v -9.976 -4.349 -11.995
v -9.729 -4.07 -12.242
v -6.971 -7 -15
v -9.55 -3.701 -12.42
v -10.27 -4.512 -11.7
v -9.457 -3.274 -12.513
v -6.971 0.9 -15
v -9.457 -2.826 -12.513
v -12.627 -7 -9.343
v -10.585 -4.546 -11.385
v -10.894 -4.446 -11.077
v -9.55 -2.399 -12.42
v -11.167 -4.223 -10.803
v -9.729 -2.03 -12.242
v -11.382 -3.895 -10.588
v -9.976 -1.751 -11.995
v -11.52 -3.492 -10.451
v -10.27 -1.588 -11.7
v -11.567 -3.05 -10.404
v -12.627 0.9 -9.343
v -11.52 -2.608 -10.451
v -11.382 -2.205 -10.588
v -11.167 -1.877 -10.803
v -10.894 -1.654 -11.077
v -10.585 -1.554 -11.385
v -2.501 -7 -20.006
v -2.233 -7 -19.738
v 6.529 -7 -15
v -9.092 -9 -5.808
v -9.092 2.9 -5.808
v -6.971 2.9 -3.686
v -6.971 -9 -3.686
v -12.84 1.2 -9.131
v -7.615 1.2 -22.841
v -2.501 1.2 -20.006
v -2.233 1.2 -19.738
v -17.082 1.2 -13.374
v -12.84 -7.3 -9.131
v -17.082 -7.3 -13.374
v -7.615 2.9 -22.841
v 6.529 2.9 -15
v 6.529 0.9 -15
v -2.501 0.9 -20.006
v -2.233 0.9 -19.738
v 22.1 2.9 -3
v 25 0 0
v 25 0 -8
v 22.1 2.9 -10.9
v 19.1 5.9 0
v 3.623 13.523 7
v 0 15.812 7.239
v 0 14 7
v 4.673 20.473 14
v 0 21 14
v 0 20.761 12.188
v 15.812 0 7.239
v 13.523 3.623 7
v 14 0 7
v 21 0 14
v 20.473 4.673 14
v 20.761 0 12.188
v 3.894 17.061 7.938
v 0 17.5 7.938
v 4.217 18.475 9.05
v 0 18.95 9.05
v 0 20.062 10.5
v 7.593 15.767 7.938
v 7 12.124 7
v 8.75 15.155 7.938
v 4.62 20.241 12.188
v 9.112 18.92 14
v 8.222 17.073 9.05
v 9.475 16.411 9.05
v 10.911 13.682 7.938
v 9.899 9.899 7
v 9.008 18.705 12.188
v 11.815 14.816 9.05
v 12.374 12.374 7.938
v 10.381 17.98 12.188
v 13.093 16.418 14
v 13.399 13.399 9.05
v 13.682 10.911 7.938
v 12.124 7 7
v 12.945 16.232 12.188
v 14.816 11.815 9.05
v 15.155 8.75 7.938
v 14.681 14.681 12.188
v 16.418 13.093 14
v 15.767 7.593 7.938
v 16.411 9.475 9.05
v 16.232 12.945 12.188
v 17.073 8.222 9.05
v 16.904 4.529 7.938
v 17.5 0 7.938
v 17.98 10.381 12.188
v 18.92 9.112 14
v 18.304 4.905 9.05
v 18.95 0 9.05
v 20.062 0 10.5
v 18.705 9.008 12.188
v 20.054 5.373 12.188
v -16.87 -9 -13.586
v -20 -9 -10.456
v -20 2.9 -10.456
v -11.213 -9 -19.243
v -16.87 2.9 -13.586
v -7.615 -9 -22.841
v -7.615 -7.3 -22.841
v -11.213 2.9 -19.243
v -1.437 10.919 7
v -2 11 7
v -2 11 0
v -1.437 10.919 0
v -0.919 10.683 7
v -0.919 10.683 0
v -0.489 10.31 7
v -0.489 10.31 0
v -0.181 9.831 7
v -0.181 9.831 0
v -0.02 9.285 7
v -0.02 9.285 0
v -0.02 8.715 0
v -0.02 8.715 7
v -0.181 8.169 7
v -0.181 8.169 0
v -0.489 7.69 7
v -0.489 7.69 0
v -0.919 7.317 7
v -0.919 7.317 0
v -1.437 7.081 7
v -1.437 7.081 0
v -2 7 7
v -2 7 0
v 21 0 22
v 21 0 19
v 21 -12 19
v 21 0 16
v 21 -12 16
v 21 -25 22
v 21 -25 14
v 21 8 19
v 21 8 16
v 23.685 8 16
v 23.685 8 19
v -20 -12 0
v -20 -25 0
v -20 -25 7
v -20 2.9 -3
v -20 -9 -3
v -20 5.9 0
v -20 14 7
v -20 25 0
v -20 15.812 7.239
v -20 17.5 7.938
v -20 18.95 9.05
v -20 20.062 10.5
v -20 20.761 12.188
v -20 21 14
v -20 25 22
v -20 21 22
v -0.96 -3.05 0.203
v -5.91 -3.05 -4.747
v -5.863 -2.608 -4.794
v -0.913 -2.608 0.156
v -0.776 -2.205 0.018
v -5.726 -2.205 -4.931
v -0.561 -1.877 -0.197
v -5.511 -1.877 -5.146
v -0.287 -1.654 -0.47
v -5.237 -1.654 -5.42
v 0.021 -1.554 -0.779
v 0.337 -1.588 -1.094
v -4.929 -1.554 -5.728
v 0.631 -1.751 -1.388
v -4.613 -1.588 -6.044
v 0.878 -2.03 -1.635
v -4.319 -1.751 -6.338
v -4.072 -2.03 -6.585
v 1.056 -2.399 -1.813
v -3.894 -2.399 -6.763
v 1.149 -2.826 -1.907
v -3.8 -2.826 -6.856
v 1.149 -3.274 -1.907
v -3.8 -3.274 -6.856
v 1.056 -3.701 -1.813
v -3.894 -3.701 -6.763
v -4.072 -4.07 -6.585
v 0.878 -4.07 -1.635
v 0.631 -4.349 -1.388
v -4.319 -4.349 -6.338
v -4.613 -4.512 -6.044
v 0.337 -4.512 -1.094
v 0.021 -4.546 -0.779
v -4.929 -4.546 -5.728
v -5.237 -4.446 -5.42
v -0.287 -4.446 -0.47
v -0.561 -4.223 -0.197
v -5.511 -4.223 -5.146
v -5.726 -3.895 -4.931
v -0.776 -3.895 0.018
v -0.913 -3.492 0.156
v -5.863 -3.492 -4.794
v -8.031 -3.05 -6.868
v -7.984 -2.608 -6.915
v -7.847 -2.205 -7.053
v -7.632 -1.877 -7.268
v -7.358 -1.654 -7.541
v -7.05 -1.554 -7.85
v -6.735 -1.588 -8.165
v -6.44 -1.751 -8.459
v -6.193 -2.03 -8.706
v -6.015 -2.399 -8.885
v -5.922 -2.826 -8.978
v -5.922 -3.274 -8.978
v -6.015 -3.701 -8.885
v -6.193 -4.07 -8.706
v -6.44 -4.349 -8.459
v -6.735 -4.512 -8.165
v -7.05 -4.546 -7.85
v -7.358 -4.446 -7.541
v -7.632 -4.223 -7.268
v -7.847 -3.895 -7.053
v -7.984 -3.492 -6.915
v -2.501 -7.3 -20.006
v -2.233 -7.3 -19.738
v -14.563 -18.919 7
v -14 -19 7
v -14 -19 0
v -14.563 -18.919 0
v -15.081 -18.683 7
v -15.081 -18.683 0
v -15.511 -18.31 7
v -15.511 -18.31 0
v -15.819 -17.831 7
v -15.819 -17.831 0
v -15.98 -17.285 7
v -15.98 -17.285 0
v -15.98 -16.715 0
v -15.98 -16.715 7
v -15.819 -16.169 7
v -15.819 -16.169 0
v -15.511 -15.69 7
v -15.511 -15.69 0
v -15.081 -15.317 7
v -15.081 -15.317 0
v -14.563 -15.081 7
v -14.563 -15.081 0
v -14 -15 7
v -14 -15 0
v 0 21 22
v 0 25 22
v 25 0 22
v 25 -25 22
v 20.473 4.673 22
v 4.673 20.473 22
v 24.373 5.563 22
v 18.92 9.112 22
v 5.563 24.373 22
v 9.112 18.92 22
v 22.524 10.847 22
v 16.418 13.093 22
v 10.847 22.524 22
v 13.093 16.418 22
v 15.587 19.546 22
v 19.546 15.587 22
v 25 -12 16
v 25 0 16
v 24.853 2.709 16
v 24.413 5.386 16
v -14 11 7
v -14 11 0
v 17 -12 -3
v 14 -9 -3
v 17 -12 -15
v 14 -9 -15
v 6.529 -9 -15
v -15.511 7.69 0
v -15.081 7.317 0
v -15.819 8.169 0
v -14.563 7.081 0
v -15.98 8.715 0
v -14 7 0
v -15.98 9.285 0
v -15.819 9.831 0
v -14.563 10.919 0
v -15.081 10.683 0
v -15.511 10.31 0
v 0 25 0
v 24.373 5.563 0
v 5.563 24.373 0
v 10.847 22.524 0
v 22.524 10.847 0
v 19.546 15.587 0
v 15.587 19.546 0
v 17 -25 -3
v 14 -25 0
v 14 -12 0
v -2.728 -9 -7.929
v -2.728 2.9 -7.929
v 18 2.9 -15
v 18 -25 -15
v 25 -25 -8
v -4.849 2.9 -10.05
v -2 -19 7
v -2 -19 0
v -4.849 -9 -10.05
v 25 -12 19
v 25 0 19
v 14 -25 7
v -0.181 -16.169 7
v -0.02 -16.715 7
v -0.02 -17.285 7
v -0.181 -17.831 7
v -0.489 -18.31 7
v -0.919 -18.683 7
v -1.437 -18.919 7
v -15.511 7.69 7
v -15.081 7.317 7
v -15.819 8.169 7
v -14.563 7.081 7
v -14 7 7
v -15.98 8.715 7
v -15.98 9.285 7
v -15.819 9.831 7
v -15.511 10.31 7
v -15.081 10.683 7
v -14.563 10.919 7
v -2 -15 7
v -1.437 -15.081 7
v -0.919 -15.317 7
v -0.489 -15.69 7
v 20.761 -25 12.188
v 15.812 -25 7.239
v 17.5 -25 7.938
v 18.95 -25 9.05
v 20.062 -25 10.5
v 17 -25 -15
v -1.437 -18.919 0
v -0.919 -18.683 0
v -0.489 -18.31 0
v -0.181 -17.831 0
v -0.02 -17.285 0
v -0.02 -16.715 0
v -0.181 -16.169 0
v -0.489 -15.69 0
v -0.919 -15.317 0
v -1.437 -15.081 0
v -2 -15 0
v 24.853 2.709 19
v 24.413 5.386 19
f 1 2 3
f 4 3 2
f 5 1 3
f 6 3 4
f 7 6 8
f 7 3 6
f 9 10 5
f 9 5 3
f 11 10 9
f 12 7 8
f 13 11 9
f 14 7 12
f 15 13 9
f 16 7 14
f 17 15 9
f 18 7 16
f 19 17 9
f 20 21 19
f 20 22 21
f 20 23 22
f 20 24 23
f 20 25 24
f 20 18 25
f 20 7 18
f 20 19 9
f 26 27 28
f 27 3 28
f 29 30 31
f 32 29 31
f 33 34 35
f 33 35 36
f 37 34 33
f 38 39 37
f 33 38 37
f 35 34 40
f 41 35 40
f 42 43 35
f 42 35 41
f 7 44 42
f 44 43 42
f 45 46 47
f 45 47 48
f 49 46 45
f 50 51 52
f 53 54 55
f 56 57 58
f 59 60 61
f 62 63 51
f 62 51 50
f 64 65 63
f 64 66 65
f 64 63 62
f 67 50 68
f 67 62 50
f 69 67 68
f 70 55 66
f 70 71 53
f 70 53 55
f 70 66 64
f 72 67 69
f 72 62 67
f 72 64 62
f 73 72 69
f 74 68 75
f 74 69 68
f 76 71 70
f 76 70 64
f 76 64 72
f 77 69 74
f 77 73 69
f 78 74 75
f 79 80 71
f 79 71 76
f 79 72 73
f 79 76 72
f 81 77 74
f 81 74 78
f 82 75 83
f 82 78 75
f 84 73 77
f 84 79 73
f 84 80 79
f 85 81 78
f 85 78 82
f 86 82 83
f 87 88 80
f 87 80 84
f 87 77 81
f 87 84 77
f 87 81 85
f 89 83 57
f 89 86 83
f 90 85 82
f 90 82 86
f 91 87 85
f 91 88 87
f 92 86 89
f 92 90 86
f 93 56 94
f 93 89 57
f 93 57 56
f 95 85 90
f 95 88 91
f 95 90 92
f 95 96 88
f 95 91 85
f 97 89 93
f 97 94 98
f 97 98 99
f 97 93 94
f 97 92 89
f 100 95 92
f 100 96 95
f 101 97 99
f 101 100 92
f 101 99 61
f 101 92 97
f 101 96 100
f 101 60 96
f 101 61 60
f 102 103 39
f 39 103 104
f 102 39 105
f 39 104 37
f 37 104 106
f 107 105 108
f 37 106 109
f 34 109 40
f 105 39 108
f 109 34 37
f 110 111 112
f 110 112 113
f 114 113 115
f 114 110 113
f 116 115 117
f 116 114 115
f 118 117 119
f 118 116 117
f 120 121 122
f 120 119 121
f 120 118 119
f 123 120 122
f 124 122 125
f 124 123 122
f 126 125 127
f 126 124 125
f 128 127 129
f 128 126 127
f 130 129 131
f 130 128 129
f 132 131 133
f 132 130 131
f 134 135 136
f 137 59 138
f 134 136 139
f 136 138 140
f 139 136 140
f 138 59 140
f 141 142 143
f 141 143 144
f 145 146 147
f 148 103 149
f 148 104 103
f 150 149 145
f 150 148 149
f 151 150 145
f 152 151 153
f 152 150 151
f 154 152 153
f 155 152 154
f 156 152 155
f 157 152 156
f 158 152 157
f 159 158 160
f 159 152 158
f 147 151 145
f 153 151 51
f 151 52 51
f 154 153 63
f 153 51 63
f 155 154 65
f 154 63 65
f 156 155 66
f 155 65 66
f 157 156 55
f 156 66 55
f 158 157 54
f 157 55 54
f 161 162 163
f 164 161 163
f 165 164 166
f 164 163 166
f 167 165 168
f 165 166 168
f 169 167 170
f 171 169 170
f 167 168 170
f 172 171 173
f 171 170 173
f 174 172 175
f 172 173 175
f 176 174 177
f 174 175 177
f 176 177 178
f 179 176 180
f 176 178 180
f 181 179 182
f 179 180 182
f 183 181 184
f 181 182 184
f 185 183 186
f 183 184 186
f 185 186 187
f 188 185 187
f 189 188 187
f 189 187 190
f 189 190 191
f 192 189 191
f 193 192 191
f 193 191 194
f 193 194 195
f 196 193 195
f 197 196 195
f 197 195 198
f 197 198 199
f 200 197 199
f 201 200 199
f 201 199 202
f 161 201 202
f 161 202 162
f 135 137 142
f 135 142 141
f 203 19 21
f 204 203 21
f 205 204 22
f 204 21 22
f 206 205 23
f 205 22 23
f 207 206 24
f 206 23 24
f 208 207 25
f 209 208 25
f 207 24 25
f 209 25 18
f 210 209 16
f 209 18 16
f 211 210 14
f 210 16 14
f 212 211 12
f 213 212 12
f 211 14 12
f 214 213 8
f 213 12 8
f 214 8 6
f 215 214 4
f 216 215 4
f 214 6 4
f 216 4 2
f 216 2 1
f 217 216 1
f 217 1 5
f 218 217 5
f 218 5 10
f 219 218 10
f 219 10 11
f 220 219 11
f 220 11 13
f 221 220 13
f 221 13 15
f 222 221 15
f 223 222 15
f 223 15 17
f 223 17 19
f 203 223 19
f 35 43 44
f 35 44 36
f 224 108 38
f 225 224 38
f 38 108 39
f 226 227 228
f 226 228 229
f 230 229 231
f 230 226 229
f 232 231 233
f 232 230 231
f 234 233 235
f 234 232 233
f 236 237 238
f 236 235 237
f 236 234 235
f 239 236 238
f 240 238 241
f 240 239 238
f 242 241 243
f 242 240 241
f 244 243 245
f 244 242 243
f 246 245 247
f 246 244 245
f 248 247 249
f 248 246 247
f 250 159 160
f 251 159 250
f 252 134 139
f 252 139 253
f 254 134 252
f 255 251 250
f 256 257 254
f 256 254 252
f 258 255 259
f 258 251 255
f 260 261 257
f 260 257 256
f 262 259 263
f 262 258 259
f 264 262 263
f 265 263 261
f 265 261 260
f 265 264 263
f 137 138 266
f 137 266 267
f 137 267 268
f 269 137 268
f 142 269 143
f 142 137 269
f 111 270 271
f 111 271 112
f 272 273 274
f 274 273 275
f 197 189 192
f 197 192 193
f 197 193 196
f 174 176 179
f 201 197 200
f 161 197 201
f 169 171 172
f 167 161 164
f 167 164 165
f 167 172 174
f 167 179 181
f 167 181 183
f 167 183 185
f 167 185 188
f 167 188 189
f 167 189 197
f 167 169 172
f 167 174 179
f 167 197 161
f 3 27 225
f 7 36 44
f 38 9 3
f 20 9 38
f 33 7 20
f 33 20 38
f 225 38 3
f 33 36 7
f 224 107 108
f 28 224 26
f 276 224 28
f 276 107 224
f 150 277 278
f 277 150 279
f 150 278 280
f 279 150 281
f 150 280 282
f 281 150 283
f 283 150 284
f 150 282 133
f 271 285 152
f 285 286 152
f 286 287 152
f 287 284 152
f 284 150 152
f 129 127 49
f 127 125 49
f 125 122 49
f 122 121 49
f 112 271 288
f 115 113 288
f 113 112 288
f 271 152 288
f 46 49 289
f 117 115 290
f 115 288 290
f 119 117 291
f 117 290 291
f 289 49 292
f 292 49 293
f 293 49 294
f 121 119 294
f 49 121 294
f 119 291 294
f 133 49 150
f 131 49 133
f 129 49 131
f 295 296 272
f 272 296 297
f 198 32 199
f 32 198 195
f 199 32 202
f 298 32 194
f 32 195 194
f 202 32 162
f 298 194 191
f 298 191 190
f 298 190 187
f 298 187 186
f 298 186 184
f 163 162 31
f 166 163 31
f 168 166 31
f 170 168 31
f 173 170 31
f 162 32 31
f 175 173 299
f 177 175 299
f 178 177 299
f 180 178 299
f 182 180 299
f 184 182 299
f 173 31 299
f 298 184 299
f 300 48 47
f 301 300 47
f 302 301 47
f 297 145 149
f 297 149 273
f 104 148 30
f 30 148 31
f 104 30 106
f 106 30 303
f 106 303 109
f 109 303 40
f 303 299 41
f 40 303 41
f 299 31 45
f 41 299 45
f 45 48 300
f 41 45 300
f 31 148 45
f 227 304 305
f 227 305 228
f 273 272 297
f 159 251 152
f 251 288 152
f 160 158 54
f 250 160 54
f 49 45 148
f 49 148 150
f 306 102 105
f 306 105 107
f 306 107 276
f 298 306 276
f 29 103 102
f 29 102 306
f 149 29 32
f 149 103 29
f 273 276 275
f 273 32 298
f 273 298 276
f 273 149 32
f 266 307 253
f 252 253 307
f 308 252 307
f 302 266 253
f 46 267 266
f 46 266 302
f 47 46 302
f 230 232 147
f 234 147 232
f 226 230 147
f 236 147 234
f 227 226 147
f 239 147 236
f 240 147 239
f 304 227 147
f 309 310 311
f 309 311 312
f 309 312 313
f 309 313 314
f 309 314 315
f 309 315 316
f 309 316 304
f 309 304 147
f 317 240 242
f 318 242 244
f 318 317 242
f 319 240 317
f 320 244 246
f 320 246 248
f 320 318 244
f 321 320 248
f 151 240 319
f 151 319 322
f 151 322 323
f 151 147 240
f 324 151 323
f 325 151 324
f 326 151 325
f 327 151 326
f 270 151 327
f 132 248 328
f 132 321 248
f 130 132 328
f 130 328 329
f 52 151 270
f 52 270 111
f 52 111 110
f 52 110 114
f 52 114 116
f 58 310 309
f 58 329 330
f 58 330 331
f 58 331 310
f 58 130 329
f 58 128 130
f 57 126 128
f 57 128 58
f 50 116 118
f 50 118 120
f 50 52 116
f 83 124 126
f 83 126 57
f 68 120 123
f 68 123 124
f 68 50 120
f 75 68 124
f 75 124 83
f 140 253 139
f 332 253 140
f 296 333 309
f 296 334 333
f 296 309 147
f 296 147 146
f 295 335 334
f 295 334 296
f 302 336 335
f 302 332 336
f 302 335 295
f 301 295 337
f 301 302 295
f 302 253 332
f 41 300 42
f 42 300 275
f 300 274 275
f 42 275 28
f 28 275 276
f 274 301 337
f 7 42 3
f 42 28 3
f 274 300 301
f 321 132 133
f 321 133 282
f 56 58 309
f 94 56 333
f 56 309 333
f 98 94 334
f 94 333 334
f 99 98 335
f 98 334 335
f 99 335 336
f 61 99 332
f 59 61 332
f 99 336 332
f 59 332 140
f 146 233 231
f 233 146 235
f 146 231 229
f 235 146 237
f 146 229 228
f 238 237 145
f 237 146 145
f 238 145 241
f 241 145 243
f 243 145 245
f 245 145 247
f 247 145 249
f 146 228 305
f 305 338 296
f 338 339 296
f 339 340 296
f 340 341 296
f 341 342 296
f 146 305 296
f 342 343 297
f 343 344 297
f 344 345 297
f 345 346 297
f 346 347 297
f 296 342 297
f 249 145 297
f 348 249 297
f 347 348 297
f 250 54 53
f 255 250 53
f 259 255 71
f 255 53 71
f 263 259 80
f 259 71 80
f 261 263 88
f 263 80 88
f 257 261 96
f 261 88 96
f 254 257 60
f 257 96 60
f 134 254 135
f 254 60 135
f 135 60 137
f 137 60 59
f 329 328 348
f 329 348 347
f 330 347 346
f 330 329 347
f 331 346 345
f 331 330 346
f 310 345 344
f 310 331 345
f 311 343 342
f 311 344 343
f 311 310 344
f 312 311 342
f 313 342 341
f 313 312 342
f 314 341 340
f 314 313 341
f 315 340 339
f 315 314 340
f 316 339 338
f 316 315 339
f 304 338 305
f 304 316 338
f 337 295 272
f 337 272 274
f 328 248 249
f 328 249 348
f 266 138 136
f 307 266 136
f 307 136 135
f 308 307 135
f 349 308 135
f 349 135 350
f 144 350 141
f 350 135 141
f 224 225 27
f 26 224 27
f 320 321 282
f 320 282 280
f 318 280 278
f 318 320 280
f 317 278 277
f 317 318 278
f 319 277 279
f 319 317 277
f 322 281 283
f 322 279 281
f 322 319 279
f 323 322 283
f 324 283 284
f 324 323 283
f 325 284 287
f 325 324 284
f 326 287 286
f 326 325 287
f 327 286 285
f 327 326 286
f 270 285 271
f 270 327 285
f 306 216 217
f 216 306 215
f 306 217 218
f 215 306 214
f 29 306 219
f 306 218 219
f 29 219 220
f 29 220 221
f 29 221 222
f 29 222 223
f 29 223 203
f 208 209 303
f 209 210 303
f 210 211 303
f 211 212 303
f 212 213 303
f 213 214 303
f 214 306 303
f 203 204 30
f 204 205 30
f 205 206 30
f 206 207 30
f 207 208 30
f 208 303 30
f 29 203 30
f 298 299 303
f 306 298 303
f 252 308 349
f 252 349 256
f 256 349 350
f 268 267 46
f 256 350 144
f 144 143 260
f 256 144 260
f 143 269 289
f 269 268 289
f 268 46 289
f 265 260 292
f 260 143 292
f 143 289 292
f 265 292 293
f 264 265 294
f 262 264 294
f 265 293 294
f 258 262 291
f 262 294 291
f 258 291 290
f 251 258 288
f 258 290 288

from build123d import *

# Parameters (mm, degrees)
BOSS_EXTRUDE1_DEPTH      = 7
EXTRUDE_THIN2_DEPTH      = 15
FILLET1_R                = 7
SKETCH5_W                = 15
SKETCH5_H                = 25
BOSS_EXTRUDE2_DEPTH      = 8
CUT_EXTRUDE2_DEPTH       = 42.641325627
LPATTERN1_COUNT          = 2
LPATTERN1_PITCH          = 26
CHAMFER3_SIZE            = 7
SKETCH9_W                = 15
SKETCH9_H                = 7
BOSS_EXTRUDE3_DEPTH      = 15
BOSS_EXTRUDE4_DEPTH      = 2
BOSS_EXTRUDE4_DEPTH_BACK = 9.9
SKETCH13_W               = 8
SKETCH13_H               = 2
BOSS_EXTRUDE6_DEPTH      = 6
CHAMFER6_SIZE            = 23.744712882
CHAMFER6_SIZE_2          = 13.5
CHAMFER7_SIZE            = 3
SKETCH14_R               = 1.5
CUT_EXTRUDE3_DEPTH       = 15
SKETCH15_W               = 15
SKETCH15_H               = 8.5
CUT_EXTRUDE4_DEPTH       = 6
CHAMFER8_SIZE            = 8
SKETCH16_W               = 3
SKETCH16_H               = 20
CUT_EXTRUDE5_DEPTH       = 54.176035971


with BuildPart() as part:
    # Sketch1 → Boss-Extrude1 (new body)
    with BuildSketch(Plane.XY):
        with BuildLine():
            Line((0, 25), (-20, 25))
            Line((-20, 25), (-20, -25))
            Line((-20, -25), (25, -25))
            Line((25, -25), (25, 0))
            ThreePointArc((25, 0), (17.67766953, 17.67766953), (0, 25))
        make_face()
    extrude(amount=BOSS_EXTRUDE1_DEPTH)

    # Sketch3 → Extrude-Thin2 (add)
    with BuildSketch(Plane.XY.offset(7)):
        with BuildLine():
            Line((25, -25), (25, 0))
            ThreePointArc((25, 0), (17.67766953, 17.67766953), (0, 25))
            Line((0, 25), (-20, 25))
            Line((-20, 25), (-20, 21))
            Line((-20, 21), (0, 21))
            ThreePointArc((0, 21), (14.849242405, 14.849242405), (21, 0))
            Line((21, 0), (21, -25))
            Line((21, -25), (25, -25))
        make_face()
    extrude(amount=EXTRUDE_THIN2_DEPTH)

    # Fillet1
    fillet1_edges = [part.edges().sort_by_distance(p)[0] for p in [
        (21, -12.5, 7),
        (14.849242405, 14.849242405, 7),
        (-10, 21, 7),
    ]]
    fillet(fillet1_edges, radius=FILLET1_R)

    # Sketch5 → Boss-Extrude2 (add)
    with BuildSketch(Plane(origin=(25, 0, 0), x_dir=(0, 0, -1), z_dir=(1, 0, 0))):
        with Locations((7.5, -12.5)):
            Rectangle(SKETCH5_W, SKETCH5_H)
    extrude(amount=-BOSS_EXTRUDE2_DEPTH)

    # Sketch8 → Cut-Extrude2 (cut, through all)
    with BuildSketch(Plane.XY.offset(7)):
        with BuildLine():
            Line((-14, -15), (-2, -15))
            ThreePointArc((-2, -15), (0, -17), (-2, -19))
            Line((-2, -19), (-14, -19))
            ThreePointArc((-14, -19), (-16, -17), (-14, -15))
        make_face()
    cut_extrude2 = extrude(amount=-CUT_EXTRUDE2_DEPTH, mode=Mode.SUBTRACT)

    # LPattern1: Cut-Extrude2 ×2
    with Locations(*[(0, i * LPATTERN1_PITCH, 0) for i in range(1, LPATTERN1_COUNT)]):
        add(cut_extrude2, mode=Mode.SUBTRACT)

    # Chamfer3
    chamfer3_edges = [part.edges().sort_by_distance(p)[0] for p in [
        (25, -12.5, -15),
    ]]
    chamfer(chamfer3_edges, length=CHAMFER3_SIZE)

    # Sketch9 → Boss-Extrude3 (add)
    with BuildSketch(Plane.ZY.offset(-17)):
        with Locations((-7.5, -3.5)):
            Rectangle(SKETCH9_W, SKETCH9_H)
    extrude(amount=BOSS_EXTRUDE3_DEPTH)

    # Sketch10 → Boss-Extrude4 (add, two sides: drawn at the far end of the back side and taken through both)
    with BuildSketch(Plane.XZ.offset(7).offset(-BOSS_EXTRUDE4_DEPTH_BACK)):
        Polygon((2, -15), (-6.970562748, -15), (-12.627416998, -9.343145751), (-16.870057685, -13.585786438), (-20, -10.455844123), (-20, 0), (17, 0), (17, -15), align=None)
        Polygon((-4.849242405, -10.050252532), (-9.091883092, -5.807611845), (-6.970562748, -3.686291501), (-2.727922061, -7.928932188), align=None, mode=Mode.SUBTRACT)
    extrude(amount=BOSS_EXTRUDE4_DEPTH + BOSS_EXTRUDE4_DEPTH_BACK)

    # Sketch13 → Boss-Extrude6 (add)
    with BuildSketch(Plane(origin=(-10.985281374, 0, -10.985281374), x_dir=(-0.7071067811865478, 0, 0.7071067811865472), z_dir=(-0.7071067811865472, 0, -0.7071067811865478))):
        with Locations((-1.67766953, 1.9)):
            Rectangle(SKETCH13_W, SKETCH13_H)
        with Locations((-1.67766953, -8)):
            Rectangle(SKETCH13_W, SKETCH13_H)
    extrude(amount=BOSS_EXTRUDE6_DEPTH)

    # Chamfer6
    # the kernel refuses this chamfer: 23.744712882, 13.5 mm, written as the material it adds along each edge
    with BuildSketch(Plane(origin=(-6.970562748, -9, -15), x_dir=(-0.7145740403020574, 0, -0.6995598194053126), z_dir=(0, 1, 0))) as chamfer6_piece_1_section:
        Polygon((CHAMFER6_SIZE * 0.999943641689, -CHAMFER6_SIZE * 0.0106166574102), (-CHAMFER6_SIZE_2 * 0.714574040302, -CHAMFER6_SIZE_2 * 0.699559819405), (0, 0), align=None)
    chamfer6_piece_1 = extrude(amount=2, mode=Mode.PRIVATE)
    chamfer6_piece_1 = split(chamfer6_piece_1, bisect_by=Plane(origin=(-9.095447466, -8, -21.360396657), z_dir=(0.7071067811865476, 0, 0.7071067811865476)), keep=Keep.TOP, mode=Mode.PRIVATE)
    add(chamfer6_piece_1)
    with BuildSketch(Plane(origin=(-6.970562748, -70.647744863, -15), x_dir=(-0.7145740403020574, 0, -0.6995598194053126), z_dir=(0, 1, 0))) as chamfer6_piece_2_section:
        Polygon((CHAMFER6_SIZE * 0.999943641689, -CHAMFER6_SIZE * 0.0106166574102), (-CHAMFER6_SIZE_2 * 0.714574040302, -CHAMFER6_SIZE_2 * 0.699559819405), (0, 0), align=None)
    chamfer6_piece_2 = extrude(amount=125.295489727, mode=Mode.PRIVATE)
    chamfer6_piece_2 = split(chamfer6_piece_2, bisect_by=Plane(origin=(-6.871868761, 2.9, -19.136817952), z_dir=(0, -1, 0)), keep=Keep.TOP, mode=Mode.PRIVATE)
    chamfer6_piece_2 = split(chamfer6_piece_2, bisect_by=Plane(origin=(-6.871868761, 0.9, -19.136817952), z_dir=(0, 1, 0)), keep=Keep.TOP, mode=Mode.PRIVATE)
    chamfer6_piece_2 = split(chamfer6_piece_2, bisect_by=Plane(origin=(-9.095447466, 1.9, -21.360396657), z_dir=(0.7071067811865476, 0, 0.7071067811865476)), keep=Keep.TOP, mode=Mode.PRIVATE)
    add(chamfer6_piece_2)
    with BuildSketch(Plane(origin=(-6.970562748, -60.747744863, -15), x_dir=(-0.7145740403020574, 0, -0.6995598194053126), z_dir=(0, 1, 0))) as chamfer6_piece_3_section:
        Polygon((CHAMFER6_SIZE * 0.999943641689, -CHAMFER6_SIZE * 0.0106166574102), (-CHAMFER6_SIZE_2 * 0.714574040302, -CHAMFER6_SIZE_2 * 0.699559819405), (0, 0), align=None)
    chamfer6_piece_3 = extrude(amount=125.295489727, mode=Mode.PRIVATE)
    chamfer6_piece_3 = split(chamfer6_piece_3, bisect_by=Plane(origin=(-6.871868761, -7, -19.136817952), z_dir=(0, -1, 0)), keep=Keep.TOP, mode=Mode.PRIVATE)
    chamfer6_piece_3 = split(chamfer6_piece_3, bisect_by=Plane(origin=(-9.095447466, -8, -21.360396657), z_dir=(0.7071067811865476, 0, 0.7071067811865476)), keep=Keep.TOP, mode=Mode.PRIVATE)
    chamfer6_piece_3 = split(chamfer6_piece_3, bisect_by=Plane(origin=(-6.871868761, -9, -19.136817952), z_dir=(0, 1, 0)), keep=Keep.TOP, mode=Mode.PRIVATE)
    add(chamfer6_piece_3)
    with BuildSketch(Plane(origin=(-6.970562748, 0.9, -15), x_dir=(-0.7145740403020574, 0, -0.6995598194053126), z_dir=(0, 1, 0))) as chamfer6_piece_4_section:
        Polygon((CHAMFER6_SIZE * 0.999943641689, -CHAMFER6_SIZE * 0.0106166574102), (-CHAMFER6_SIZE_2 * 0.714574040302, -CHAMFER6_SIZE_2 * 0.699559819405), (0, 0), align=None)
    chamfer6_piece_4 = extrude(amount=2, mode=Mode.PRIVATE)
    chamfer6_piece_4 = split(chamfer6_piece_4, bisect_by=Plane(origin=(-9.095447466, 1.9, -21.360396657), z_dir=(0.7071067811865476, 0, 0.7071067811865476)), keep=Keep.TOP, mode=Mode.PRIVATE)
    add(chamfer6_piece_4)

    # Chamfer7
    chamfer7_edges = [part.edges().sort_by_distance(p)[0] for p in [
        (-1.5, 2.9, 0),
        (17, -9, -7.5),
        (17, -17, 0),
        (-1.5, -9, 0),
    ]]
    chamfer(chamfer7_edges, length=CHAMFER7_SIZE)

    # Sketch14 → Cut-Extrude3 (cut)
    with BuildSketch(Plane(origin=(-10.985281374, 0, -10.985281374), x_dir=(-0.7071067811865478, 0, 0.7071067811865472), z_dir=(-0.7071067811865472, 0, -0.7071067811865478))):
        with Locations((-0.67766953, -3.05)):
            Circle(SKETCH14_R)
    extrude(amount=-CUT_EXTRUDE3_DEPTH, mode=Mode.SUBTRACT)

    # Sketch15 → Cut-Extrude4 (cut)
    with BuildSketch(Plane(origin=(-15.227922061, 0, -15.227922061), x_dir=(-0.7071067811865475, 0, 0.7071067811865477), z_dir=(-0.7071067811865477, 0, -0.7071067811865475))):
        with Locations((-4.87766953, -3.05)):
            Rectangle(SKETCH15_W, SKETCH15_H)
    extrude(amount=-CUT_EXTRUDE4_DEPTH, mode=Mode.SUBTRACT)

    # Chamfer8
    # the kernel refuses this chamfer: 8 mm, written as the material it adds along each edge
    with BuildSketch(Plane(origin=(17, 0, 0), x_dir=(0.9996219169112968, -0.02749587661058649, 0), z_dir=(0, 0, -1))) as chamfer8_piece_1_section:
        Polygon((CHAMFER8_SIZE * 0.999621916911, -CHAMFER8_SIZE * 0.0274958766106), (-CHAMFER8_SIZE * 0.0274958766106, -CHAMFER8_SIZE * 0.999621916911), (0, 0), align=None)
    chamfer8_piece_1 = extrude(amount=15, mode=Mode.PRIVATE)
    chamfer8_piece_1 = split(chamfer8_piece_1, bisect_by=Plane(origin=(25, 1.068527792, -2.415736104), z_dir=(-1, 0, 0)), keep=Keep.TOP, mode=Mode.PRIVATE)
    chamfer8_piece_1 = split(chamfer8_piece_1, bisect_by=Plane(origin=(20.463014023, 2.9, -2.415736104), z_dir=(0, -1, 0)), keep=Keep.TOP, mode=Mode.PRIVATE)
    chamfer8_piece_1 = split(chamfer8_piece_1, bisect_by=Plane(origin=(20.463014023, 2.276395844, -3.623604156), z_dir=(0, -0.7071067811865476, 0.7071067811865476)), keep=Keep.TOP, mode=Mode.PRIVATE)
    add(chamfer8_piece_1)
    with BuildSketch(Plane(origin=(17, 0, 20.573463904), x_dir=(0.9996219169112968, -0.02749587661058651, 0), z_dir=(0, 0, -1))) as chamfer8_piece_2_section:
        Polygon((CHAMFER8_SIZE * 0.999621916911, -CHAMFER8_SIZE * 0.0274958766106), (-CHAMFER8_SIZE * 0.0274958766106, -CHAMFER8_SIZE * 0.999621916911), (0, 0), align=None)
    chamfer8_piece_2 = extrude(amount=35.573463904, mode=Mode.PRIVATE)
    chamfer8_piece_2 = split(chamfer8_piece_2, bisect_by=Plane(origin=(17.28092154, 7.132229333, 0), z_dir=(0, 0, 1)), keep=Keep.TOP, mode=Mode.PRIVATE)
    chamfer8_piece_2 = split(chamfer8_piece_2, bisect_by=Plane(origin=(17.28092154, 6.824172, 0.924172), z_dir=(0, 0.7071067811865476, -0.7071067811865476)), keep=Keep.TOP, mode=Mode.PRIVATE)
    add(chamfer8_piece_2)
    with BuildSketch(Plane(origin=(17, 0, 0), x_dir=(0.9996219169112968, -0.02749587661058649, 0), z_dir=(0, 0, -1))) as chamfer8_piece_3_section:
        Polygon((CHAMFER8_SIZE * 0.999621916911, -CHAMFER8_SIZE * 0.0274958766106), (-CHAMFER8_SIZE * 0.0274958766106, -CHAMFER8_SIZE * 0.999621916911), (0, 0), align=None)
    chamfer8_piece_3 = extrude(amount=15, mode=Mode.PRIVATE)
    chamfer8_piece_3 = split(chamfer8_piece_3, bisect_by=Plane(origin=(19.029775324, 2.9, -1.05711343), z_dir=(0, 1, 0)), keep=Keep.TOP, mode=Mode.PRIVATE)
    chamfer8_piece_3 = split(chamfer8_piece_3, bisect_by=Plane(origin=(19.029775324, 4.314329856, -1.585670144), z_dir=(0, -0.7071067811865476, 0.7071067811865476)), keep=Keep.TOP, mode=Mode.PRIVATE)
    add(chamfer8_piece_3)
    with BuildSketch(Plane(origin=(17, 0, 0), x_dir=(0.9996219169112968, -0.02749587661058649, 0), z_dir=(0, 0, -1))) as chamfer8_piece_4_section:
        Polygon((CHAMFER8_SIZE * 0.999621916911, -CHAMFER8_SIZE * 0.0274958766106), (-CHAMFER8_SIZE * 0.0274958766106, -CHAMFER8_SIZE * 0.999621916911), (0, 0), align=None)
    chamfer8_piece_4 = extrude(amount=15, mode=Mode.PRIVATE)
    chamfer8_piece_4 = split(chamfer8_piece_4, bisect_by=Plane(origin=(21.997895662, 1.393550415, -11.002104338), z_dir=(-0.7071067811865476, 0, 0.7071067811865476)), keep=Keep.TOP, mode=Mode.PRIVATE)
    chamfer8_piece_4 = split(chamfer8_piece_4, bisect_by=Plane(origin=(25, 1.393550415, -8.795226249), z_dir=(-1, 0, 0)), keep=Keep.TOP, mode=Mode.PRIVATE)
    chamfer8_piece_4 = split(chamfer8_piece_4, bisect_by=Plane(origin=(19.791017572, 2.9, -8.795226249), z_dir=(0, -1, 0)), keep=Keep.TOP, mode=Mode.PRIVATE)
    chamfer8_piece_4 = split(chamfer8_piece_4, bisect_by=Plane(origin=(19.791017572, -0.750837917, -6.650837917), z_dir=(0, 0.7071067811865476, -0.7071067811865476)), keep=Keep.TOP, mode=Mode.PRIVATE)
    add(chamfer8_piece_4)

    # Sketch16 → Cut-Extrude5 (cut, through all)
    with BuildSketch(Plane.ZY.offset(-21)):
        with Locations((17.5, -2)):
            Rectangle(SKETCH16_W, SKETCH16_H)
    extrude(amount=-CUT_EXTRUDE5_DEPTH, mode=Mode.SUBTRACT)


solid = part.part
